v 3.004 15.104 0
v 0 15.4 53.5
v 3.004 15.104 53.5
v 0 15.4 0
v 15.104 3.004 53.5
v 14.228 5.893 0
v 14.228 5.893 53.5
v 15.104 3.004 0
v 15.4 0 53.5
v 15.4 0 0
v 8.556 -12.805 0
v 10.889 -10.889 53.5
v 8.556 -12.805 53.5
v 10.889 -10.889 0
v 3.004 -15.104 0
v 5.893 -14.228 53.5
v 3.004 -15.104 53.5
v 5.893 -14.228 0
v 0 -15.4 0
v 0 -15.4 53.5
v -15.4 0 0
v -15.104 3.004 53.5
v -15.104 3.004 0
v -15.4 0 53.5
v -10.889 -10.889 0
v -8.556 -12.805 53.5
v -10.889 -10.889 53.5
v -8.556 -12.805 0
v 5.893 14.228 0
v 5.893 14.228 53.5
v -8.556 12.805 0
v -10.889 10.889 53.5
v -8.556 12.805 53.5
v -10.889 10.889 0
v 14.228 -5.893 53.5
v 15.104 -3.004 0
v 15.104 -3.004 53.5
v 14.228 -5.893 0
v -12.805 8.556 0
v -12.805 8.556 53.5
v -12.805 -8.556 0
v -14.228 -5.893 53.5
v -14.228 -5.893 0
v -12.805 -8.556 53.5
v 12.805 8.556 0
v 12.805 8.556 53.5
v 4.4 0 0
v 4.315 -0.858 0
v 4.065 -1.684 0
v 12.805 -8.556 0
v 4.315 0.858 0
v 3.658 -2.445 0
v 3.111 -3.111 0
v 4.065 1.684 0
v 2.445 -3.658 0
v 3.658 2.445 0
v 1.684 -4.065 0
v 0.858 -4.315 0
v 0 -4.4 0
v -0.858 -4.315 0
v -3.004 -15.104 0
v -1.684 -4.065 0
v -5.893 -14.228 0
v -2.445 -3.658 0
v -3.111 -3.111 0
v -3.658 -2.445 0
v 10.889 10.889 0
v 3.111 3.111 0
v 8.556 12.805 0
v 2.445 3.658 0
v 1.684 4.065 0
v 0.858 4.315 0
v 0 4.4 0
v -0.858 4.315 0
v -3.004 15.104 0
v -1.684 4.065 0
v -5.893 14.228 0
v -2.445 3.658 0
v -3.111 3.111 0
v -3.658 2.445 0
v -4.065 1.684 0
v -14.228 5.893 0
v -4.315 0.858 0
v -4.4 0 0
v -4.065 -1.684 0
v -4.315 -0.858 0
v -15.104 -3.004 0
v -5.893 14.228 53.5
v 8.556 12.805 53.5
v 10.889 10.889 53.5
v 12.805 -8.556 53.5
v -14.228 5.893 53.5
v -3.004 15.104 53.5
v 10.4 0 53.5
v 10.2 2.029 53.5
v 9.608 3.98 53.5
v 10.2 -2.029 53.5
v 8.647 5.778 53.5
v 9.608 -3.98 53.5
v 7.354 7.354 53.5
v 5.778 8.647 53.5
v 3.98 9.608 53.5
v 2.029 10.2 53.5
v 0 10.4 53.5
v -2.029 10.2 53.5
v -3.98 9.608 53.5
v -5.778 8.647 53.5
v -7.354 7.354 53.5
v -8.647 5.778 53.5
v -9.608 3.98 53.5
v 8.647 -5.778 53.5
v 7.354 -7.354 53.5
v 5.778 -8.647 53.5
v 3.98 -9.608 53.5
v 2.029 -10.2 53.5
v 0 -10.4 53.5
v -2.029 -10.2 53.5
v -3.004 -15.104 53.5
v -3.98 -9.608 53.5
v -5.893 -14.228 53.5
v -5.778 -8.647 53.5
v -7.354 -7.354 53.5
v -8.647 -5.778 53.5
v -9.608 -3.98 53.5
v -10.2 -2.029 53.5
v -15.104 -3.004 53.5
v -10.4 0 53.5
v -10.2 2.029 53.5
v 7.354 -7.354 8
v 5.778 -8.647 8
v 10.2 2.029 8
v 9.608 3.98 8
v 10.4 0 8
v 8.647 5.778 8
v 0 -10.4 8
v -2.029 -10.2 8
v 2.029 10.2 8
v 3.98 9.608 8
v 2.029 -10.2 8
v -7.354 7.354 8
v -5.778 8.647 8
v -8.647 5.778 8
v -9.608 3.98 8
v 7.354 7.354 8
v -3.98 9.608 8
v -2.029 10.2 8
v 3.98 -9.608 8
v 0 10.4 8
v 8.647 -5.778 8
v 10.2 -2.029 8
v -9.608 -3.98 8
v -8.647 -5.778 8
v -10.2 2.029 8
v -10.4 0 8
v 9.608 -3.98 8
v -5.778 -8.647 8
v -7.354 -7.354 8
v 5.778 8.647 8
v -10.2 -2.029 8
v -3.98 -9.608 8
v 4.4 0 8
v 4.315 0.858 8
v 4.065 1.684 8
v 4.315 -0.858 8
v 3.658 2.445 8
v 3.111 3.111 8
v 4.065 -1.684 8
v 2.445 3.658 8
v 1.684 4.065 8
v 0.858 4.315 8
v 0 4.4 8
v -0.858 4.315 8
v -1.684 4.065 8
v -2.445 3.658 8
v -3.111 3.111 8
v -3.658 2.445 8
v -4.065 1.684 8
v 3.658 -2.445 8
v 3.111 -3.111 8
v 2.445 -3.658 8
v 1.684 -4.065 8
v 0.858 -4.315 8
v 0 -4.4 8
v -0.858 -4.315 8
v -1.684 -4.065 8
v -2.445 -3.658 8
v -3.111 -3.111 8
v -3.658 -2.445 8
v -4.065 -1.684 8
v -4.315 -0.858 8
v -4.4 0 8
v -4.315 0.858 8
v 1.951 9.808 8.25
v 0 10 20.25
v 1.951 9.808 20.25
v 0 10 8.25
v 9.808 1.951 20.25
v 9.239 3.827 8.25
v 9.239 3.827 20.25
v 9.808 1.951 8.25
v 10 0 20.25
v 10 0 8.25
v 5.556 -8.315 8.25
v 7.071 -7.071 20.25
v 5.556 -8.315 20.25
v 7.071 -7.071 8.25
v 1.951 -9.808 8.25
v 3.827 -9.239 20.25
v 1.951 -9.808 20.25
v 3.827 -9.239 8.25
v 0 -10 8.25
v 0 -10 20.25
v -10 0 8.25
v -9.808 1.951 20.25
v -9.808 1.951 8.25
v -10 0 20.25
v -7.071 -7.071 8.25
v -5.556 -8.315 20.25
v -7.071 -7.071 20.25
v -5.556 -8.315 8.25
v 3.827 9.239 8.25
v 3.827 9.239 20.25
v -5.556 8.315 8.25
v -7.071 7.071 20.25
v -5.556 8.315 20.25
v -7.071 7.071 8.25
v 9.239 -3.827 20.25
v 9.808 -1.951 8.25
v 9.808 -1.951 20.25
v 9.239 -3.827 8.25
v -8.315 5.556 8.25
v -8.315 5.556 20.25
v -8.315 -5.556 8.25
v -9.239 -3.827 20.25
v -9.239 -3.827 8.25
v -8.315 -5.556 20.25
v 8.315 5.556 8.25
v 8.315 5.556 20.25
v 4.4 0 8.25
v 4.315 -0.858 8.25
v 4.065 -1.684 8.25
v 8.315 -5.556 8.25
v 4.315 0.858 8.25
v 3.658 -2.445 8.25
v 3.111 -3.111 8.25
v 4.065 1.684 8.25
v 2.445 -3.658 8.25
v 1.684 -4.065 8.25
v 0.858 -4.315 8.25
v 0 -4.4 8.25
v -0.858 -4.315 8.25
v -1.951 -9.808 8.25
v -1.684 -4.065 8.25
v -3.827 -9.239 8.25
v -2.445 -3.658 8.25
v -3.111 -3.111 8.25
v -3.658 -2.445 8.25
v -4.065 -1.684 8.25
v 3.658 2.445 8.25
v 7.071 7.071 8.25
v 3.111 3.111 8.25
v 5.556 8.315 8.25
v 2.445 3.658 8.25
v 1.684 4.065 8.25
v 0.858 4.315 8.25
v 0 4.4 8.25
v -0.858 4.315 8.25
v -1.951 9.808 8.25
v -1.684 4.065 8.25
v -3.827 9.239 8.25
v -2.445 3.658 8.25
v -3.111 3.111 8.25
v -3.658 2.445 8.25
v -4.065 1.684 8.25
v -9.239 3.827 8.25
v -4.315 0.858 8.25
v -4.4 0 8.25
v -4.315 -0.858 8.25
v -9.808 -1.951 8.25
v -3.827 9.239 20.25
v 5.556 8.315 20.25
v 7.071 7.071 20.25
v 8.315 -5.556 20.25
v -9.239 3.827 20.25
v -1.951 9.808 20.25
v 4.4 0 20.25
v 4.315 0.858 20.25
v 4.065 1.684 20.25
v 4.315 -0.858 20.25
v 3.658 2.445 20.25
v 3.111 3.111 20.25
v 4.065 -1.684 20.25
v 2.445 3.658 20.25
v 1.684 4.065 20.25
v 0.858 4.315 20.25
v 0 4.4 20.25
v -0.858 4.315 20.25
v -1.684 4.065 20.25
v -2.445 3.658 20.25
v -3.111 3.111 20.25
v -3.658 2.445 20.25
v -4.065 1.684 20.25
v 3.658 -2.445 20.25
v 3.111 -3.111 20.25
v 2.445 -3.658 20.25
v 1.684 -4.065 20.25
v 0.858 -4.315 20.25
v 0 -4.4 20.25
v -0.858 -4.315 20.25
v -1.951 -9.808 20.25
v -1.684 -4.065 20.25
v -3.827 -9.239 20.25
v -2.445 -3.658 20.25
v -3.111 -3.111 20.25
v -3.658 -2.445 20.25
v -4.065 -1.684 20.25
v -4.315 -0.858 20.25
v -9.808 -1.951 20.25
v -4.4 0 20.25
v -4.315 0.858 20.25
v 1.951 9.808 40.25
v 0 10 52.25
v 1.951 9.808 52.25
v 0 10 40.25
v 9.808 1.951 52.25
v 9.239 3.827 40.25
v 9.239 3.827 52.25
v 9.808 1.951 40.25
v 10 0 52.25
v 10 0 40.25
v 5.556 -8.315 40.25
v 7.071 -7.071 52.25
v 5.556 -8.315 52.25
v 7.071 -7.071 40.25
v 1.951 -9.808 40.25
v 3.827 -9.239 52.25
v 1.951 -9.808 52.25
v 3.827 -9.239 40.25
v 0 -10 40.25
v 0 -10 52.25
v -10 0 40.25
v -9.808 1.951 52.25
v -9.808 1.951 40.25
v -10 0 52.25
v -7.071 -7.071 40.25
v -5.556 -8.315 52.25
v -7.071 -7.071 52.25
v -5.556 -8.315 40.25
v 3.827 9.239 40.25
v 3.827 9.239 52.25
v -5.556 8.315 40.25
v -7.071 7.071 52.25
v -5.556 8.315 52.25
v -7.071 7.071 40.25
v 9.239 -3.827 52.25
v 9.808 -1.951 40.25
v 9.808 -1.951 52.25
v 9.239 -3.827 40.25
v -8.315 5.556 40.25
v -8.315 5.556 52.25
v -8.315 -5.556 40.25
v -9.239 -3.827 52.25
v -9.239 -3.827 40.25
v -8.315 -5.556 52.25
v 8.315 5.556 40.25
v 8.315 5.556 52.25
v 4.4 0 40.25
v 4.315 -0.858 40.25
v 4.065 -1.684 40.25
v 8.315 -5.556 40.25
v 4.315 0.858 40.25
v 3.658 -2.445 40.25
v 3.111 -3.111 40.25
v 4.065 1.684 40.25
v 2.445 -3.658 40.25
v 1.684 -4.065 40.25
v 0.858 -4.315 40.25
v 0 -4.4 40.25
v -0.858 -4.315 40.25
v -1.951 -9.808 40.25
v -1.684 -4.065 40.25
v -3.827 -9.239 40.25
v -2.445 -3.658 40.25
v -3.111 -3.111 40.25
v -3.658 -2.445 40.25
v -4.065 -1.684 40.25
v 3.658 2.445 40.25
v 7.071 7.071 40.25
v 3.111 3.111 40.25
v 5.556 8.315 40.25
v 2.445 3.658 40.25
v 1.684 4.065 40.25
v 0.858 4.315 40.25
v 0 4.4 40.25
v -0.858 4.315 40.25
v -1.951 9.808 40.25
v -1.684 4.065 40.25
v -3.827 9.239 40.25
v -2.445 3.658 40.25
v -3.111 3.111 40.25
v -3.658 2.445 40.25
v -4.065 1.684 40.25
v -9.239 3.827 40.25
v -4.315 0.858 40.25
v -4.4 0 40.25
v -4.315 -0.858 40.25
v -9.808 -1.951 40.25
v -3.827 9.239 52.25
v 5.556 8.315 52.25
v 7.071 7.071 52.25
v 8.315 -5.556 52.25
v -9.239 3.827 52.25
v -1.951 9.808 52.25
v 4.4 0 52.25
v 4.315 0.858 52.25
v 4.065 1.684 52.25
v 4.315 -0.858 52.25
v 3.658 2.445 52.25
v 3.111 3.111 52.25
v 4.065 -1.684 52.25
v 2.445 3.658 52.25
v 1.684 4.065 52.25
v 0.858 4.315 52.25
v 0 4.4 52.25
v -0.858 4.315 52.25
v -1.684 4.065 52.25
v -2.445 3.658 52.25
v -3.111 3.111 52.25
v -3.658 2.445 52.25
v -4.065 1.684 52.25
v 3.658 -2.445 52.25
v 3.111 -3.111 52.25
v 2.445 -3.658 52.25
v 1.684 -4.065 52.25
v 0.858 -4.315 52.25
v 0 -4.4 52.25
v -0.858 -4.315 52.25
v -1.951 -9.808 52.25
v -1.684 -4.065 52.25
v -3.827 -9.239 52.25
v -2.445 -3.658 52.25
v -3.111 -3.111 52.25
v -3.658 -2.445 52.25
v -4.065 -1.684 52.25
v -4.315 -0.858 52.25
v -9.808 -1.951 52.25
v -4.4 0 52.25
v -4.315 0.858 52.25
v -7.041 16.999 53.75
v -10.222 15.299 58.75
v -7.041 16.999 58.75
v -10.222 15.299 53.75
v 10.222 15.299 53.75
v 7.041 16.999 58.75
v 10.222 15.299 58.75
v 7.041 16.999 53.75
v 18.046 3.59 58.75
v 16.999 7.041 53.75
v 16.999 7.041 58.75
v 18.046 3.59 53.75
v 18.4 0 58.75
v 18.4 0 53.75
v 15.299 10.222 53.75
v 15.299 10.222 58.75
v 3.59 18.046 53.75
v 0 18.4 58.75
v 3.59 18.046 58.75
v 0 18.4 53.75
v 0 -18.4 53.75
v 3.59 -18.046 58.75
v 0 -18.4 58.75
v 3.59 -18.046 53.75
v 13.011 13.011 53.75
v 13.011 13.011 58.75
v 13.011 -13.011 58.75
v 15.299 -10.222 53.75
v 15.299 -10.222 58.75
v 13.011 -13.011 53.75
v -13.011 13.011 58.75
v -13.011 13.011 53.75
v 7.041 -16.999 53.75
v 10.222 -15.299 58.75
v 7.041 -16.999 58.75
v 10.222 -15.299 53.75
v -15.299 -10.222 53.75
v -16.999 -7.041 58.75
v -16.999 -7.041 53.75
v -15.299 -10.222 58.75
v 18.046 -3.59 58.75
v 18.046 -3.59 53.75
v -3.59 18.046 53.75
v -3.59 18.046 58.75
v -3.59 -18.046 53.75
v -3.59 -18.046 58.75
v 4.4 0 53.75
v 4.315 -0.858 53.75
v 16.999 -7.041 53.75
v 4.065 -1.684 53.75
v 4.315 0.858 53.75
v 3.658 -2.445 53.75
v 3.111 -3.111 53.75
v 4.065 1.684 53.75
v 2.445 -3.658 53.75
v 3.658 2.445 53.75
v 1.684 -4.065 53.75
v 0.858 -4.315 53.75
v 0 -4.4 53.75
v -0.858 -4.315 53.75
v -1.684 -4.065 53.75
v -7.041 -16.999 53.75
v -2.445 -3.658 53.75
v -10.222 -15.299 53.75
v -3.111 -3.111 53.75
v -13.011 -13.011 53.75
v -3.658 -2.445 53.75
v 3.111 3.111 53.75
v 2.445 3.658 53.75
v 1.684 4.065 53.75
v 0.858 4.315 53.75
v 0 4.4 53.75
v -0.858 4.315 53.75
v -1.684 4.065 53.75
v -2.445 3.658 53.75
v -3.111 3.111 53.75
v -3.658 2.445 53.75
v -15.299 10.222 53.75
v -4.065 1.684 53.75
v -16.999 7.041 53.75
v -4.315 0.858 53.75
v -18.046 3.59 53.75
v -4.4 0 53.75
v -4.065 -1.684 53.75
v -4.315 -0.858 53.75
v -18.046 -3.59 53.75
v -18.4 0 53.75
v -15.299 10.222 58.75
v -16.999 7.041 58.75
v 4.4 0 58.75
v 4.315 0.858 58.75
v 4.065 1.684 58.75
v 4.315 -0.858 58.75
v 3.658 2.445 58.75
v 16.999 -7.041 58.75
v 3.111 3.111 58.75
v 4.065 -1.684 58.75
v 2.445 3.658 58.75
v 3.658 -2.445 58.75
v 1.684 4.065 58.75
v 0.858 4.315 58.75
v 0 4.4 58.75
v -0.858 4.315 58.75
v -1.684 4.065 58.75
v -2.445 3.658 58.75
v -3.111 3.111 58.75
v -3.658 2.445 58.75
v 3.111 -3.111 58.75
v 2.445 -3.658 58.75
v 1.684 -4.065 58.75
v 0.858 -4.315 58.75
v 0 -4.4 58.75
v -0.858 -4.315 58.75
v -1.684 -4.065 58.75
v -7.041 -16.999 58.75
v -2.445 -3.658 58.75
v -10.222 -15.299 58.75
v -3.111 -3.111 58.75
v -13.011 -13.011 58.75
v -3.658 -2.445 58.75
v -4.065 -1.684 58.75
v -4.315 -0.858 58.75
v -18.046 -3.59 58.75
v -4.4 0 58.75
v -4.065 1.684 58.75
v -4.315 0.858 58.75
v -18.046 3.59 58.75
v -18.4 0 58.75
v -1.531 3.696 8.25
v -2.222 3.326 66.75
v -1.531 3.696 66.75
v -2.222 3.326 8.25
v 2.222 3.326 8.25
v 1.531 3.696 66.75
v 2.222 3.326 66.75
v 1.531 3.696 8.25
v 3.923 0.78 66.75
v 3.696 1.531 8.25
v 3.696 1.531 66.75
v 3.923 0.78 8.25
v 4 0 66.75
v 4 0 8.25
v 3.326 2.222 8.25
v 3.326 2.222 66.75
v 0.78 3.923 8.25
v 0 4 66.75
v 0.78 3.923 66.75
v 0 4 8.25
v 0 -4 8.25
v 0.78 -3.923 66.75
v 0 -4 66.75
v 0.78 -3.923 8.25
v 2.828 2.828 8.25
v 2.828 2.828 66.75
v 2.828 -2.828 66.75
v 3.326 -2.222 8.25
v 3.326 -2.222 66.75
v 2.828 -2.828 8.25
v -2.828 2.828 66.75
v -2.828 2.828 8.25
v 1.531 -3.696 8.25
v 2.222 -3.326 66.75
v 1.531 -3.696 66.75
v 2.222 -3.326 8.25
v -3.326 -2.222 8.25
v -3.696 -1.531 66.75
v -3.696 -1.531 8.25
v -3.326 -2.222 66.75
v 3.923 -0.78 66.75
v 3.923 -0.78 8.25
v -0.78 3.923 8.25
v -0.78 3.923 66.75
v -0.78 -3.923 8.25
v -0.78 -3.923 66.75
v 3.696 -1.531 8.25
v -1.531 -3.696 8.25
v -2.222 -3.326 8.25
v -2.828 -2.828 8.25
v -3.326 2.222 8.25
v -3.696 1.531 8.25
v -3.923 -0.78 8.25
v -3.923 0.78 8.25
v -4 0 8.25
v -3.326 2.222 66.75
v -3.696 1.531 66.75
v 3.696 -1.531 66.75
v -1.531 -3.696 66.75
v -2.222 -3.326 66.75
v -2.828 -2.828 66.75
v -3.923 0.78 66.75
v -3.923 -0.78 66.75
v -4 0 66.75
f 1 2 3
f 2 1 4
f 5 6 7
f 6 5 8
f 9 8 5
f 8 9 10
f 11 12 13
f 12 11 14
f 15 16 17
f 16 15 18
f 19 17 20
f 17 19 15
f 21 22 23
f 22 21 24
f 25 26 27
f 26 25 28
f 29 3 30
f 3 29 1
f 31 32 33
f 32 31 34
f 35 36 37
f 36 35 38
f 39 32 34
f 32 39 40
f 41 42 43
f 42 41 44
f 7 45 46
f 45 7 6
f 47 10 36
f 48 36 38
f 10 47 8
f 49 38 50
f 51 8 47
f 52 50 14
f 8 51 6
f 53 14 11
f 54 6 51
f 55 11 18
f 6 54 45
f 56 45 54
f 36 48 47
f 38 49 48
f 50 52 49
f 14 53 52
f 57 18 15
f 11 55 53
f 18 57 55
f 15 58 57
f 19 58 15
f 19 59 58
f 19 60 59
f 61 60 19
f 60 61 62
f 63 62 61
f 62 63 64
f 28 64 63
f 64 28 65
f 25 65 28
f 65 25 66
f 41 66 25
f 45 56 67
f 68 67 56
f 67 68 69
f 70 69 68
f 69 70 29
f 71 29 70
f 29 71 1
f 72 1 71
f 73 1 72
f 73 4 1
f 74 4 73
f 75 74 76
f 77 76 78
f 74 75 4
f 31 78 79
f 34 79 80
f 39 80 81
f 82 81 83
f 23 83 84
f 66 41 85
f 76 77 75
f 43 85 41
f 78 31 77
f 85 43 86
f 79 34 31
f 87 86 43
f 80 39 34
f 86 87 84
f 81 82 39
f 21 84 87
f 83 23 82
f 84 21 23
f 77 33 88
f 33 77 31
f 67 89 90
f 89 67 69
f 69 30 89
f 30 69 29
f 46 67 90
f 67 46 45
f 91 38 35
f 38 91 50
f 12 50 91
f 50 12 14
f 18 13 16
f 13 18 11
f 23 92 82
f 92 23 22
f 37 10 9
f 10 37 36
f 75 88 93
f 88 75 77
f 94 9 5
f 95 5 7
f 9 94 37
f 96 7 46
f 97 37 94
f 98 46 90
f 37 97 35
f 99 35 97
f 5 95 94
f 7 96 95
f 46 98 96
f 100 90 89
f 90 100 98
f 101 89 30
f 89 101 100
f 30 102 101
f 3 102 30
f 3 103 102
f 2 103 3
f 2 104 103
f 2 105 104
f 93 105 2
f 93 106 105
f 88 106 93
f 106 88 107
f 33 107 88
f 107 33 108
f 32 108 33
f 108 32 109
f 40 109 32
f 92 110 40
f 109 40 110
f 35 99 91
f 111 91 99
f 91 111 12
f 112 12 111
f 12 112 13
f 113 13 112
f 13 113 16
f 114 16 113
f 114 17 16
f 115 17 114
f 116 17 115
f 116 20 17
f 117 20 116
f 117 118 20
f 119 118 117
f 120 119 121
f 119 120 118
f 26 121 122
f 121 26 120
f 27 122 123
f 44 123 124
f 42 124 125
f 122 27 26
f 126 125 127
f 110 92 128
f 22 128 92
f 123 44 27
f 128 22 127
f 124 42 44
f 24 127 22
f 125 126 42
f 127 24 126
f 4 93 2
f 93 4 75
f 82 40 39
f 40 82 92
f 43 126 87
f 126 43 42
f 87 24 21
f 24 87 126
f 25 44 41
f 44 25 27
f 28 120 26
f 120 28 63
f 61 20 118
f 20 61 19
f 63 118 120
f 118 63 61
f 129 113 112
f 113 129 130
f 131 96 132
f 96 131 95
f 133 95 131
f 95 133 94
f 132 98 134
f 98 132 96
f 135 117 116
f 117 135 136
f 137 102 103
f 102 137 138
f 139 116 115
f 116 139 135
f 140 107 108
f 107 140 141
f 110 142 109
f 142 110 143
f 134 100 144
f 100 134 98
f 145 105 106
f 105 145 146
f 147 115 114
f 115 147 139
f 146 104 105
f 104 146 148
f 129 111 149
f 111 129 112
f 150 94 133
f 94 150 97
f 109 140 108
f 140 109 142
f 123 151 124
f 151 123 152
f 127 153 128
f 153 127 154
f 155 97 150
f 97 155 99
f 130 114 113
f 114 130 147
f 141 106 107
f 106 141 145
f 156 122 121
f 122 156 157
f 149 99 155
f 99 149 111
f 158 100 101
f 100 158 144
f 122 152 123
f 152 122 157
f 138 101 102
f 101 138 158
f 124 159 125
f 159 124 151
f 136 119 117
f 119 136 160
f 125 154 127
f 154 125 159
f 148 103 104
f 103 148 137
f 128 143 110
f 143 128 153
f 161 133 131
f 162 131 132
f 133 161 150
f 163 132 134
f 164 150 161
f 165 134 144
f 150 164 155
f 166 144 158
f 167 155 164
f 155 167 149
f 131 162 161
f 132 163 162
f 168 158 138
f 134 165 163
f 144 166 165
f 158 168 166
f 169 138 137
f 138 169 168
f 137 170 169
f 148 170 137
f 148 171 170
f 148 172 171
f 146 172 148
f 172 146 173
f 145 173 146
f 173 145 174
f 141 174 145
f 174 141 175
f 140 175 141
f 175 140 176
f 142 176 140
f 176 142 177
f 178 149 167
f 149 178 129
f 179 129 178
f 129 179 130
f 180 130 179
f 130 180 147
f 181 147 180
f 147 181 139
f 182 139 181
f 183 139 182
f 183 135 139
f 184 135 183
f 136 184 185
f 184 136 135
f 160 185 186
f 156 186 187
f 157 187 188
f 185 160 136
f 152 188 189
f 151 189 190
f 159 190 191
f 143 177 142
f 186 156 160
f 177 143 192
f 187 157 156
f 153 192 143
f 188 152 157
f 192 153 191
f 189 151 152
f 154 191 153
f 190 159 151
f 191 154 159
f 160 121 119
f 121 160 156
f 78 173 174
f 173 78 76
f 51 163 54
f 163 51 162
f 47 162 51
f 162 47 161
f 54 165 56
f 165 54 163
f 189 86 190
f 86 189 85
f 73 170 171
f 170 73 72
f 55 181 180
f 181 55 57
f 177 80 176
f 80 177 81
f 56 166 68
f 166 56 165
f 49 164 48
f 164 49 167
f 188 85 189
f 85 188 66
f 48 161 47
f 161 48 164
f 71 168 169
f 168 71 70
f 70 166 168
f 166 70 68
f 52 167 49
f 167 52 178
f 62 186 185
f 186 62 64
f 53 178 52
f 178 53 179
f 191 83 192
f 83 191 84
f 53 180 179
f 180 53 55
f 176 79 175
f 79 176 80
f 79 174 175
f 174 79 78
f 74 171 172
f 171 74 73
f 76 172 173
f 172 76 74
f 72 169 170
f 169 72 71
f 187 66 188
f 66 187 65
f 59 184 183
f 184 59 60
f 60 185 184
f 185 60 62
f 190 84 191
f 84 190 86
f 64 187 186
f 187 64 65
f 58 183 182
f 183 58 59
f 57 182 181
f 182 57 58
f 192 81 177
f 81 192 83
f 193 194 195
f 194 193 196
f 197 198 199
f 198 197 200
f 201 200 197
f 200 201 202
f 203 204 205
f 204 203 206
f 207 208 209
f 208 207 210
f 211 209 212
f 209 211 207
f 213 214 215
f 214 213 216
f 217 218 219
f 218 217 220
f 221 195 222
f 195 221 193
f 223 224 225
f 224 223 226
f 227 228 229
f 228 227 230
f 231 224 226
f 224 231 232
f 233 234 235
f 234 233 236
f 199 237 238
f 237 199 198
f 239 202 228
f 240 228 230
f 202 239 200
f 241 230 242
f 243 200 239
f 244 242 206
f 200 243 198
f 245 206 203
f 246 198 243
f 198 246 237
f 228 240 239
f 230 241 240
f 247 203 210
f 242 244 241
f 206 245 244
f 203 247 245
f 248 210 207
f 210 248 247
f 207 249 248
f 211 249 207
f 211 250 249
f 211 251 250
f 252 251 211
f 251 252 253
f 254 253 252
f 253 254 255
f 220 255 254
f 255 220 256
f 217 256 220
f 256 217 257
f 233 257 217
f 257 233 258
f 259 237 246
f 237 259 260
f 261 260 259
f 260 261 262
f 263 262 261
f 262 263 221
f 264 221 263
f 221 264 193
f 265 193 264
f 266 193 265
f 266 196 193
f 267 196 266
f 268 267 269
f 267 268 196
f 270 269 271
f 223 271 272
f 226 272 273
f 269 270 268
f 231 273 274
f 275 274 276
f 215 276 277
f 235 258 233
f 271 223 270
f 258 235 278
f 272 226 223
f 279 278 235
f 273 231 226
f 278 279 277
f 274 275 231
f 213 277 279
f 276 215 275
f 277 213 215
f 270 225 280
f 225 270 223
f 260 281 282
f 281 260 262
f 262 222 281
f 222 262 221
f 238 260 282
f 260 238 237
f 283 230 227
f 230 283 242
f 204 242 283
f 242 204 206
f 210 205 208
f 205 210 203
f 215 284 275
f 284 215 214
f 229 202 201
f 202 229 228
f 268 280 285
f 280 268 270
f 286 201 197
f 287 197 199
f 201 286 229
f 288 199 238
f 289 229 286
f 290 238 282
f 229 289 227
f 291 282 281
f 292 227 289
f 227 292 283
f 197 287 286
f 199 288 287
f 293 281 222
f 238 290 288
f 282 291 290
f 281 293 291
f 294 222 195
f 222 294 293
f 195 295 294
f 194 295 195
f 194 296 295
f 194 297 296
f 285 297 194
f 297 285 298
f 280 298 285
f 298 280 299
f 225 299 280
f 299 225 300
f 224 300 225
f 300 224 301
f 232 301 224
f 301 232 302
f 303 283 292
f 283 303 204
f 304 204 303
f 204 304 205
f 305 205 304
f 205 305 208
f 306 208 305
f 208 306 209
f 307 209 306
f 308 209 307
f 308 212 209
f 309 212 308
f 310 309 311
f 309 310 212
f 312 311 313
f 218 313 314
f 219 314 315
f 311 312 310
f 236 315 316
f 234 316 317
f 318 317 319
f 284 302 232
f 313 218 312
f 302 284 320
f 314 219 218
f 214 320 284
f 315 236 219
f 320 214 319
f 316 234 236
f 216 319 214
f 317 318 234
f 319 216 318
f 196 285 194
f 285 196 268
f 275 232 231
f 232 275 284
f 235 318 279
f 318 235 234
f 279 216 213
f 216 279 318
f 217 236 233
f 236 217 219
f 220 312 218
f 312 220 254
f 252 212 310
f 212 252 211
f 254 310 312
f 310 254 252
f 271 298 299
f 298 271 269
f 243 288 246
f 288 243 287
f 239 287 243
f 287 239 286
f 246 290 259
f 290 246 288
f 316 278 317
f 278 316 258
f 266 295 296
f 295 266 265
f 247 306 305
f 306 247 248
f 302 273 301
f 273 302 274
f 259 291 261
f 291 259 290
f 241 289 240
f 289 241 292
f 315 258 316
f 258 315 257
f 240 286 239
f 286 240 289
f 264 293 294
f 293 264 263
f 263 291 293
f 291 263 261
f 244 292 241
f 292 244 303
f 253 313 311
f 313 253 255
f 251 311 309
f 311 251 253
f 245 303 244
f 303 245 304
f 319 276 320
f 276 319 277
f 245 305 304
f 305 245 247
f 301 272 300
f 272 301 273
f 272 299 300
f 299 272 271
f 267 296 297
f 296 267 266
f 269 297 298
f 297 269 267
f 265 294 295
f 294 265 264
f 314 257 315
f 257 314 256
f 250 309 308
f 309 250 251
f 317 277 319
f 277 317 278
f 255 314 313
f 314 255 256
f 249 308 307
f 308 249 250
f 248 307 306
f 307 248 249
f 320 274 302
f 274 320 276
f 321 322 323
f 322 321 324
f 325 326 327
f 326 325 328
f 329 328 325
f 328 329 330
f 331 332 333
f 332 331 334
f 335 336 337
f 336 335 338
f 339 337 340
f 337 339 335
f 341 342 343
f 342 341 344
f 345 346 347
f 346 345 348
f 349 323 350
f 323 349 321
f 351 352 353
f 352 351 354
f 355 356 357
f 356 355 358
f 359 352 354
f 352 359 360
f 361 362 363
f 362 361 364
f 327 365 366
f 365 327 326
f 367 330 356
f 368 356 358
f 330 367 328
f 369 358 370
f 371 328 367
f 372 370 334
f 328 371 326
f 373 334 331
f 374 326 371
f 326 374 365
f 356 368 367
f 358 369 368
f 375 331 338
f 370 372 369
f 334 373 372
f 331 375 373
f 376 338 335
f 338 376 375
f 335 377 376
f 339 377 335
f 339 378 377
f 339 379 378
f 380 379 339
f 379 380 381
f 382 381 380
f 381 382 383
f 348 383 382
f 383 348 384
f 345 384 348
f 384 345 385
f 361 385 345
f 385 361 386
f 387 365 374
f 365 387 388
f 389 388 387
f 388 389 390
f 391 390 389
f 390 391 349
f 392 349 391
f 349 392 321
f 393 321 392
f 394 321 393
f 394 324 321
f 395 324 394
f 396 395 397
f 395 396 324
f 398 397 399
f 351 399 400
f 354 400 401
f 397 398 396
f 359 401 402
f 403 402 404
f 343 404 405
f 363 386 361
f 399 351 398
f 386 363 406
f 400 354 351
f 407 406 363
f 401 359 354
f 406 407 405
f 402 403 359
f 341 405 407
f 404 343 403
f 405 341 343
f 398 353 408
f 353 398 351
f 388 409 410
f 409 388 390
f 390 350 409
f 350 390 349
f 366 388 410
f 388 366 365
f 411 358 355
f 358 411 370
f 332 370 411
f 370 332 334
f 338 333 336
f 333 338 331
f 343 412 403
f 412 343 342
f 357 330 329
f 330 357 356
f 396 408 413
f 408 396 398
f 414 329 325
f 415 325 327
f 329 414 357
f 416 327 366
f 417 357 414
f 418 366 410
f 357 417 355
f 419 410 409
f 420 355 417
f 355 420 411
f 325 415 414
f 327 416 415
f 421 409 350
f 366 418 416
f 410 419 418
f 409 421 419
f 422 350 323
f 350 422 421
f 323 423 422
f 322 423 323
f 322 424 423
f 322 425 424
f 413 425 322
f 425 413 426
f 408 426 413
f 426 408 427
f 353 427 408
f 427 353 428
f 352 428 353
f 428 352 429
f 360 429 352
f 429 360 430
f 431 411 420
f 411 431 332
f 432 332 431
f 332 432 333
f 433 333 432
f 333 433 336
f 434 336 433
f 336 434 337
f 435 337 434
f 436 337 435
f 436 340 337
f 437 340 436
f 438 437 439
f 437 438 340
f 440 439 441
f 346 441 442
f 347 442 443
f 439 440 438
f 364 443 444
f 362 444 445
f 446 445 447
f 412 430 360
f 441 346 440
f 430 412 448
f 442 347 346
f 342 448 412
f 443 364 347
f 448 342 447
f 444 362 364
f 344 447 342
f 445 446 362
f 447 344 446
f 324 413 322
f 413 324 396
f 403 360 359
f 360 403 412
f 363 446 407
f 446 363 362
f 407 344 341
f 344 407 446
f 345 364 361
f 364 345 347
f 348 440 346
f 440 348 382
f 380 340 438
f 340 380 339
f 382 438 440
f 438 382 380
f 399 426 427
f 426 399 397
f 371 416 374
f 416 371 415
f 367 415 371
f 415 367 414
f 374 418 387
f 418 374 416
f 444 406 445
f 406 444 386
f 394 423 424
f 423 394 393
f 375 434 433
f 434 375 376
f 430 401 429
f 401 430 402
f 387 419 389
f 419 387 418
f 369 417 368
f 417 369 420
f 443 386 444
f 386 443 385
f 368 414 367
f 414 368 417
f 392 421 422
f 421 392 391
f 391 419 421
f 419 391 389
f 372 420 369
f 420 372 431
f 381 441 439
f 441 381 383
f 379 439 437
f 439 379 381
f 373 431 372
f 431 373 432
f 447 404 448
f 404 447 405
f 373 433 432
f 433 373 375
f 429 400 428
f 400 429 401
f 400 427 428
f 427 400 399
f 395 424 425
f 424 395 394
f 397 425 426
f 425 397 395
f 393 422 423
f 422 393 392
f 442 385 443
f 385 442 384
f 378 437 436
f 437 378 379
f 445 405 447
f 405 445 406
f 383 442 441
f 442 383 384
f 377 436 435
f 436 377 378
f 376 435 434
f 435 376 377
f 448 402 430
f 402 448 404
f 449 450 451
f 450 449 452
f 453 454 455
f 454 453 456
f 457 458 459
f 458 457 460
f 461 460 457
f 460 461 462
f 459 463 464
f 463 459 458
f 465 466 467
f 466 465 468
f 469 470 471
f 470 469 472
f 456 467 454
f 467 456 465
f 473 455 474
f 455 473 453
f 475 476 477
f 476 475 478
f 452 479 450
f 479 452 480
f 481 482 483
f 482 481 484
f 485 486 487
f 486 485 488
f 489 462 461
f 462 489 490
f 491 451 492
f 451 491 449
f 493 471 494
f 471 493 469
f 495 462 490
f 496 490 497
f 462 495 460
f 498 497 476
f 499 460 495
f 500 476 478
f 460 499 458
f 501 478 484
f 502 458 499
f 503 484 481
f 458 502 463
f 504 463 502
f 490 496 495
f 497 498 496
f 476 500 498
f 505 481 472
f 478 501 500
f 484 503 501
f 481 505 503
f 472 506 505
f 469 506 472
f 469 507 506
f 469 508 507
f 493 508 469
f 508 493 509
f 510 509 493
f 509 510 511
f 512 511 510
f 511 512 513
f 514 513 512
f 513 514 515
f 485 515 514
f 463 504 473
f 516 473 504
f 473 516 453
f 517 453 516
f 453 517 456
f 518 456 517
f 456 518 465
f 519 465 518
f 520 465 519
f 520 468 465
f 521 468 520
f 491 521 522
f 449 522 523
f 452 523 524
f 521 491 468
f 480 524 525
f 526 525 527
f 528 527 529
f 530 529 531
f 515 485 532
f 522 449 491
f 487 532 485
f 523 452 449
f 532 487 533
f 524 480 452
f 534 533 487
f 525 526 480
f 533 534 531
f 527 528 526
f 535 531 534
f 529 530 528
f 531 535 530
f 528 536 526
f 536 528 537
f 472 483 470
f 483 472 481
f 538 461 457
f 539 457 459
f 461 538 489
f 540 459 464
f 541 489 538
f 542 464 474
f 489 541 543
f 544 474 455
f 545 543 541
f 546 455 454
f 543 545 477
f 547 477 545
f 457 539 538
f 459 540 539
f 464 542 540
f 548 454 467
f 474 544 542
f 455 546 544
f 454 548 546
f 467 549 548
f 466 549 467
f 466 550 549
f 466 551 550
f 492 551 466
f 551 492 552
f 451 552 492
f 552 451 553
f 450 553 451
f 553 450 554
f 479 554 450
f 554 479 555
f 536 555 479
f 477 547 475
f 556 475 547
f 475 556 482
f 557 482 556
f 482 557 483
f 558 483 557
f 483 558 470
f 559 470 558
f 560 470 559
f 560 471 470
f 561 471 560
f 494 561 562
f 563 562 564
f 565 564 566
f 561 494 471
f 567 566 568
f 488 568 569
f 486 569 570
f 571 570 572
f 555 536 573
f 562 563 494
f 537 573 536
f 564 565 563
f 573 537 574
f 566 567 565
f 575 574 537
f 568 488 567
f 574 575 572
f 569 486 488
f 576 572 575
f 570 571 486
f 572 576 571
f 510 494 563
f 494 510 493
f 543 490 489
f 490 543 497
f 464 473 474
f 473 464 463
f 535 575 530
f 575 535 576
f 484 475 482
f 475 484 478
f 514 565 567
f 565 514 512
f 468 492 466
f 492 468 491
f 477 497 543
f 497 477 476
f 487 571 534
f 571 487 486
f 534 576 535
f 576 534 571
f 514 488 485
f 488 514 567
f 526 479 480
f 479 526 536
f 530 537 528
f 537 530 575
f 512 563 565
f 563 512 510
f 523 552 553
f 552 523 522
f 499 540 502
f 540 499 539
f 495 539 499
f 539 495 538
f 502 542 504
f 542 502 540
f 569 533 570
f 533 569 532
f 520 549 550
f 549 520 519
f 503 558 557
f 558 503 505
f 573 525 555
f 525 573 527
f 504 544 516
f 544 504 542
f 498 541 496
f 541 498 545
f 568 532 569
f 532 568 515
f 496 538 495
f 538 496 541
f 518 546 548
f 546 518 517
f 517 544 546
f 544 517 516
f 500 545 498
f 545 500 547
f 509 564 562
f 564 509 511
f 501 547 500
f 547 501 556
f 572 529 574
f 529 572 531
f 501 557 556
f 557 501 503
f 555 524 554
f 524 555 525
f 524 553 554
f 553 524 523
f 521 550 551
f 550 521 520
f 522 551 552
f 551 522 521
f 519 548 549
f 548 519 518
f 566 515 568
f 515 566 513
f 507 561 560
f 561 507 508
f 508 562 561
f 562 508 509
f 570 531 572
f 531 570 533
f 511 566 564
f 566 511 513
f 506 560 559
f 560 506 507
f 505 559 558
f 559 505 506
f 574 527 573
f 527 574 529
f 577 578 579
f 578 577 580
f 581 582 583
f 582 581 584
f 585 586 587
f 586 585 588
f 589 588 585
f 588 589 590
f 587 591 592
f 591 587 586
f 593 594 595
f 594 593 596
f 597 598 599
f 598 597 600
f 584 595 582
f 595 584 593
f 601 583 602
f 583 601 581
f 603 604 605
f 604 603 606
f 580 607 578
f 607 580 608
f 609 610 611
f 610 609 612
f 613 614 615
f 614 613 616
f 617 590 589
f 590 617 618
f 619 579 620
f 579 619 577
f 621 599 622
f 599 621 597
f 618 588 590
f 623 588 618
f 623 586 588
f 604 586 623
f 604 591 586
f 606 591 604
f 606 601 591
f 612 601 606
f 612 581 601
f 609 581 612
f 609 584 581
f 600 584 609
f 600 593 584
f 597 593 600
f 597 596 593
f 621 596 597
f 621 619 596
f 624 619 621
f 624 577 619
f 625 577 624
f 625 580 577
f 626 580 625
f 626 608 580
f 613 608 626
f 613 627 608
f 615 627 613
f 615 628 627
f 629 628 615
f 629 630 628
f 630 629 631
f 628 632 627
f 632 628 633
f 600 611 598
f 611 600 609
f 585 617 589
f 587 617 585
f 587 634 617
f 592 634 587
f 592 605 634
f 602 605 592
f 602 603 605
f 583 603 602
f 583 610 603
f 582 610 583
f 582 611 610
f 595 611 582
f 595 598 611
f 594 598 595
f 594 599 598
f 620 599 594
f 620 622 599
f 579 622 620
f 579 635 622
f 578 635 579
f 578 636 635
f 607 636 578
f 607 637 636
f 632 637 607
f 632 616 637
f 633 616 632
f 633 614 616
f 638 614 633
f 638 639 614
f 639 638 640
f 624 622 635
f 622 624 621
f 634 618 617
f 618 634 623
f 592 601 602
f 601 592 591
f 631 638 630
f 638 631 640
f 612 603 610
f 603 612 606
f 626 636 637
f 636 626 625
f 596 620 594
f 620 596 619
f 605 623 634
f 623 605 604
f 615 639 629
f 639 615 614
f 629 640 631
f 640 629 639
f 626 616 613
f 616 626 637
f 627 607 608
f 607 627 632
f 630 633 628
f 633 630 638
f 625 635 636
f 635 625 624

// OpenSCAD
$fn = 32;

// ------------------------------------------------------------------------
// Shaft station: cup d30.8 x 53.5 mm, shaft d8
// Every part is its own module, assembly() places every instance.
// ------------------------------------------------------------------------

// --- part 1 ---
module housing_cup() {
  difference() {
    cylinder(h = 53.5, d = 30.8);
    translate([0, 0, 8]) cylinder(h = 46.5, d = 20.8);
    translate([0, 0, -1]) cylinder(h = 10, d = 8.8);
  }
}

// --- part 2 ---
module bearing_lower() {
  difference() {
      translate([0, 0, 0]) cylinder(h = 12, d = 20);
      translate([0, 0, -1]) cylinder(h = 14, d = 8.8);
    }
}

// --- part 3 ---
module bearing_upper() {
  difference() {
      translate([0, 0, 0]) cylinder(h = 12, d = 20);
      translate([0, 0, -1]) cylinder(h = 14, d = 8.8);
    }
}

// --- part 4 ---
module station_shaft() {
  translate([0, 0, -29.25]) cylinder(h = 58.5, d = 8);
}

// --- part 5 ---
module station_cover() {
  difference() {
    cylinder(h = 5, d = 36.8);
    translate([0, 0, -1]) cylinder(h = 7, d = 8.8);
  }
}

// --- assembly ---
module assembly() {
  color([0.80, 0.24, 0.20]) translate([0, 0, 0]) rotate([0, 0, 0]) housing_cup();
  color([0.20, 0.45, 0.75]) translate([0, 0, 8.25]) rotate([0, 0, 0]) bearing_lower();
  color([0.25, 0.62, 0.32]) translate([0, 0, 40.25]) rotate([0, 0, 0]) bearing_upper();
  color([0.92, 0.70, 0.18]) translate([0, 0, 37.5]) rotate([0, 0, 0]) station_shaft();
  color([0.58, 0.35, 0.70]) translate([0, 0, 53.75]) rotate([0, 0, 0]) station_cover();
}

assembly();
